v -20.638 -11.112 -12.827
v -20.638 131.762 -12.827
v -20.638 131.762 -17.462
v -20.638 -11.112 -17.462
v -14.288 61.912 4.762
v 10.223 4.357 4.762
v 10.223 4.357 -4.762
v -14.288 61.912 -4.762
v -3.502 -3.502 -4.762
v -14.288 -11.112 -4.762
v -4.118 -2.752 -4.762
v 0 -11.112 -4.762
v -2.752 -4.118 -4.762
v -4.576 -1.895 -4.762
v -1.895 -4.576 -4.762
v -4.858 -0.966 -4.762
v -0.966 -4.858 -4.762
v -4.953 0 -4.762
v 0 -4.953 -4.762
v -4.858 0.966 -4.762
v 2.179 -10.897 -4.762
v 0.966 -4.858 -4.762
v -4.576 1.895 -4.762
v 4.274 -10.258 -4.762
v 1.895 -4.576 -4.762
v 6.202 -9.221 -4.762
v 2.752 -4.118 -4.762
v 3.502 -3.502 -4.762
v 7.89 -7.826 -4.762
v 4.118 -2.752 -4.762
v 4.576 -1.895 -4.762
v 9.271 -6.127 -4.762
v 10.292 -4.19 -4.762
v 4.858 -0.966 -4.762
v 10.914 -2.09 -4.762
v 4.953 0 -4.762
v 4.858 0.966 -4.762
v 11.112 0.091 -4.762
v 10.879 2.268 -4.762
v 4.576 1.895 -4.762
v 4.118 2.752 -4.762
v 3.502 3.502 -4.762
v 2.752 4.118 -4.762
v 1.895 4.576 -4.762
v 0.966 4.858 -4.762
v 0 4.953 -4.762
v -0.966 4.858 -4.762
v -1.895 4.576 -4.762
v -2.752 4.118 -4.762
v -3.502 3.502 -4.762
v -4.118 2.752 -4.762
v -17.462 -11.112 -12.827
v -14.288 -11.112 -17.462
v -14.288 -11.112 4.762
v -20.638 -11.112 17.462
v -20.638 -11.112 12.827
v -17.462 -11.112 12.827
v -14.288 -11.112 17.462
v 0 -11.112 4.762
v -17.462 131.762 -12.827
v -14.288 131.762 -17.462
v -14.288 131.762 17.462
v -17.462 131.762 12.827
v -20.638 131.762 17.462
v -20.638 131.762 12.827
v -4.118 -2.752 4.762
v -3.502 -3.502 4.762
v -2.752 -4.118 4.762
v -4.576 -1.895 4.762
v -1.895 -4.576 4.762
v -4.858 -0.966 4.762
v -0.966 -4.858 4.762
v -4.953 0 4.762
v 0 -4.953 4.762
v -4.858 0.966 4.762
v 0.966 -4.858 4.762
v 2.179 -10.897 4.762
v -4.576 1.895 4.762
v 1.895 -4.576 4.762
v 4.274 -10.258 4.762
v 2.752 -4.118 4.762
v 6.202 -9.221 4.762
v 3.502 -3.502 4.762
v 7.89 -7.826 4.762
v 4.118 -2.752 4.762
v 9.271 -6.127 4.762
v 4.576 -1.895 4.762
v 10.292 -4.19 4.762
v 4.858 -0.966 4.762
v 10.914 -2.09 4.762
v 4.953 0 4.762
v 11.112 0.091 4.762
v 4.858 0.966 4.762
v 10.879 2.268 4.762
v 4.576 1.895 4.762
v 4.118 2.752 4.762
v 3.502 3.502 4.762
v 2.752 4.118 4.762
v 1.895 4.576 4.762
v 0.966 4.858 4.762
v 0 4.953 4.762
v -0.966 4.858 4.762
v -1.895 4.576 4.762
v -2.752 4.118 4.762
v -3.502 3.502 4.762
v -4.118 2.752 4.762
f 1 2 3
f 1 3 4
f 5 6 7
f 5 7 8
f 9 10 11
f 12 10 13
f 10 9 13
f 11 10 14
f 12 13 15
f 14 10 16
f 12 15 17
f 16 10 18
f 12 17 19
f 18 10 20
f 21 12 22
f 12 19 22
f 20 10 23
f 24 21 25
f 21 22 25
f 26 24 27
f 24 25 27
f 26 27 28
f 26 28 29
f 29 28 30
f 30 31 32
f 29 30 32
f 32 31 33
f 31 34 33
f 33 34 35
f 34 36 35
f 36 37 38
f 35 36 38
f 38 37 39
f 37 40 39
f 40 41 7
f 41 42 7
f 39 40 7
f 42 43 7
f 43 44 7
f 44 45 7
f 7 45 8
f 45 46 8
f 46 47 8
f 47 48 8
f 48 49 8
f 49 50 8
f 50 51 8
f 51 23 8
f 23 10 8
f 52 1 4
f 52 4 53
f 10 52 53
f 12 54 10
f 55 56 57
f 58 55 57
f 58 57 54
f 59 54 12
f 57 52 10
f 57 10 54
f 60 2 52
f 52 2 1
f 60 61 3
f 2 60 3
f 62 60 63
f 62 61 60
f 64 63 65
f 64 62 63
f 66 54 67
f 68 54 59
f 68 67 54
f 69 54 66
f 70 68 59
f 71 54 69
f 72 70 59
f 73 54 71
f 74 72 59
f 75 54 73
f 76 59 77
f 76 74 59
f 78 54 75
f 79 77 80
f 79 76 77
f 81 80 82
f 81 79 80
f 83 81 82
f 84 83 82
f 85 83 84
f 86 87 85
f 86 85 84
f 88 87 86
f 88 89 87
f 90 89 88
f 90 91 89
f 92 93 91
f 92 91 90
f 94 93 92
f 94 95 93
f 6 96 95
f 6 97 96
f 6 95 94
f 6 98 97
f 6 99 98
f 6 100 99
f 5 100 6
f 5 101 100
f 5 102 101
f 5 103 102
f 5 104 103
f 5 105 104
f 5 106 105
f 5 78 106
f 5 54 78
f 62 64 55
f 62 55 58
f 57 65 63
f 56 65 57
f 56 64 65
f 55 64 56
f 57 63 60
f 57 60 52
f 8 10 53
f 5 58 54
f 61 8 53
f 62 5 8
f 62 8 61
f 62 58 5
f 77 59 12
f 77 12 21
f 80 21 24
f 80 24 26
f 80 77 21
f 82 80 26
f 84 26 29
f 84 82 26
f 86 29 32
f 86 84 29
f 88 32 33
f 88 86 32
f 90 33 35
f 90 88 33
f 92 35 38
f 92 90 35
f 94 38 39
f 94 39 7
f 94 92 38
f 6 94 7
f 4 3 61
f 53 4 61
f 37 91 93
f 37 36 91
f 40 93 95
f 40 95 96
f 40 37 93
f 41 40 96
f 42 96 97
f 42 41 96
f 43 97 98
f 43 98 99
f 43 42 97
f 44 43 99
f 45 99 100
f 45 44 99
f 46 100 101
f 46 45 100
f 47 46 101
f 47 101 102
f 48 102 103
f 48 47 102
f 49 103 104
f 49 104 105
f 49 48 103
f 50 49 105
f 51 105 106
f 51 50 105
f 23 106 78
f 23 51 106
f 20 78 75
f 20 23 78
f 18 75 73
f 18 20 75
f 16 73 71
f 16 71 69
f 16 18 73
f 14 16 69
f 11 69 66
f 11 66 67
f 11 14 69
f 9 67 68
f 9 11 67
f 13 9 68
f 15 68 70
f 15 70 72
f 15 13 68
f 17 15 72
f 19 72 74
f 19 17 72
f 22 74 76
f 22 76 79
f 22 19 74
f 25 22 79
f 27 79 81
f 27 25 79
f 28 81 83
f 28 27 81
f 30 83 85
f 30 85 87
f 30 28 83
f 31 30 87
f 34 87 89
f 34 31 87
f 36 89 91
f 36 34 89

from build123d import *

# Parameters (mm, degrees)
F0_R     = 4.953
F1_DEPTH = 4.7625
F2_DEPTH = 17.4625
F3_W     = 142.875
F3_H     = 25.654
F4_DEPTH = 3.175
F6_DEPTH = 4.7625
F8_DEPTH = 4.7625


with BuildPart() as f1:
    # F0 (on Top) → F1 (new body, symmetric)
    with BuildSketch(Plane.XY):
        with BuildLine():
            ThreePointArc((9.746036, 5.338768), (5.663947, 9.56072), (0, 11.1125))
            Line((0, 11.1125), (-14.2875, 11.1125))
            Line((-14.2875, 11.1125), (-14.2875, -11.1125))
            Line((-14.2875, -11.1125), (0, -11.1125))
            ThreePointArc((0, -11.1125), (9.56072, -5.663947), (9.746036, 5.338768))
        make_face()
        Circle(F0_R, mode=Mode.SUBTRACT)
    extrude(amount=F1_DEPTH, both=True)

    # F0 (on Top) → F2 (join, symmetric)
    with BuildSketch(Plane.XY):
        Polygon((-14.2875, -11.1125), (-14.2875, 11.1125), (-14.2875, 49.2125), (-14.2875, 131.7625), (-20.6375, 131.7625), (-20.6375, -11.1125), align=None)
    extrude(amount=F2_DEPTH, both=True)

    # F3 (on face) → F4 (cut)
    with BuildSketch(Plane(origin=(-20.6375, 0, 0), x_dir=(0, -1, 0), z_dir=(-1, 0, 0))):
        with Locations((-60.325, 0)):
            Rectangle(F3_W, F3_H)
    extrude(amount=-F4_DEPTH, mode=Mode.SUBTRACT)

    # F5 (on Top) → F8 (join, symmetric)
    with BuildSketch(Plane.XY):
        with BuildLine():
            Line((-14.2875, 11.1125), (0, 11.1125))
            ThreePointArc((0, 11.1125), (6.127987, 9.270136), (10.224032, 4.353943))
            Line((10.224032, 4.353943), (-14.2875, 61.9125))
            Line((-14.2875, 61.9125), (-14.2875, 11.1125))
        make_face()
    extrude(amount=F8_DEPTH, both=True)


with BuildPart() as f6:
    # F5 (on Top) → F6 (new body, symmetric)
    with BuildSketch(Plane.XY):
        with BuildLine():
            Line((-14.2875, 11.1125), (0, 11.1125))
            ThreePointArc((0, 11.1125), (6.127987, 9.270136), (10.224032, 4.353943))
            Line((10.224032, 4.353943), (-14.2875, 61.9125))
            Line((-14.2875, 61.9125), (-14.2875, 11.1125))
        make_face()
    extrude(amount=F6_DEPTH, both=True)


solid = f1.part
